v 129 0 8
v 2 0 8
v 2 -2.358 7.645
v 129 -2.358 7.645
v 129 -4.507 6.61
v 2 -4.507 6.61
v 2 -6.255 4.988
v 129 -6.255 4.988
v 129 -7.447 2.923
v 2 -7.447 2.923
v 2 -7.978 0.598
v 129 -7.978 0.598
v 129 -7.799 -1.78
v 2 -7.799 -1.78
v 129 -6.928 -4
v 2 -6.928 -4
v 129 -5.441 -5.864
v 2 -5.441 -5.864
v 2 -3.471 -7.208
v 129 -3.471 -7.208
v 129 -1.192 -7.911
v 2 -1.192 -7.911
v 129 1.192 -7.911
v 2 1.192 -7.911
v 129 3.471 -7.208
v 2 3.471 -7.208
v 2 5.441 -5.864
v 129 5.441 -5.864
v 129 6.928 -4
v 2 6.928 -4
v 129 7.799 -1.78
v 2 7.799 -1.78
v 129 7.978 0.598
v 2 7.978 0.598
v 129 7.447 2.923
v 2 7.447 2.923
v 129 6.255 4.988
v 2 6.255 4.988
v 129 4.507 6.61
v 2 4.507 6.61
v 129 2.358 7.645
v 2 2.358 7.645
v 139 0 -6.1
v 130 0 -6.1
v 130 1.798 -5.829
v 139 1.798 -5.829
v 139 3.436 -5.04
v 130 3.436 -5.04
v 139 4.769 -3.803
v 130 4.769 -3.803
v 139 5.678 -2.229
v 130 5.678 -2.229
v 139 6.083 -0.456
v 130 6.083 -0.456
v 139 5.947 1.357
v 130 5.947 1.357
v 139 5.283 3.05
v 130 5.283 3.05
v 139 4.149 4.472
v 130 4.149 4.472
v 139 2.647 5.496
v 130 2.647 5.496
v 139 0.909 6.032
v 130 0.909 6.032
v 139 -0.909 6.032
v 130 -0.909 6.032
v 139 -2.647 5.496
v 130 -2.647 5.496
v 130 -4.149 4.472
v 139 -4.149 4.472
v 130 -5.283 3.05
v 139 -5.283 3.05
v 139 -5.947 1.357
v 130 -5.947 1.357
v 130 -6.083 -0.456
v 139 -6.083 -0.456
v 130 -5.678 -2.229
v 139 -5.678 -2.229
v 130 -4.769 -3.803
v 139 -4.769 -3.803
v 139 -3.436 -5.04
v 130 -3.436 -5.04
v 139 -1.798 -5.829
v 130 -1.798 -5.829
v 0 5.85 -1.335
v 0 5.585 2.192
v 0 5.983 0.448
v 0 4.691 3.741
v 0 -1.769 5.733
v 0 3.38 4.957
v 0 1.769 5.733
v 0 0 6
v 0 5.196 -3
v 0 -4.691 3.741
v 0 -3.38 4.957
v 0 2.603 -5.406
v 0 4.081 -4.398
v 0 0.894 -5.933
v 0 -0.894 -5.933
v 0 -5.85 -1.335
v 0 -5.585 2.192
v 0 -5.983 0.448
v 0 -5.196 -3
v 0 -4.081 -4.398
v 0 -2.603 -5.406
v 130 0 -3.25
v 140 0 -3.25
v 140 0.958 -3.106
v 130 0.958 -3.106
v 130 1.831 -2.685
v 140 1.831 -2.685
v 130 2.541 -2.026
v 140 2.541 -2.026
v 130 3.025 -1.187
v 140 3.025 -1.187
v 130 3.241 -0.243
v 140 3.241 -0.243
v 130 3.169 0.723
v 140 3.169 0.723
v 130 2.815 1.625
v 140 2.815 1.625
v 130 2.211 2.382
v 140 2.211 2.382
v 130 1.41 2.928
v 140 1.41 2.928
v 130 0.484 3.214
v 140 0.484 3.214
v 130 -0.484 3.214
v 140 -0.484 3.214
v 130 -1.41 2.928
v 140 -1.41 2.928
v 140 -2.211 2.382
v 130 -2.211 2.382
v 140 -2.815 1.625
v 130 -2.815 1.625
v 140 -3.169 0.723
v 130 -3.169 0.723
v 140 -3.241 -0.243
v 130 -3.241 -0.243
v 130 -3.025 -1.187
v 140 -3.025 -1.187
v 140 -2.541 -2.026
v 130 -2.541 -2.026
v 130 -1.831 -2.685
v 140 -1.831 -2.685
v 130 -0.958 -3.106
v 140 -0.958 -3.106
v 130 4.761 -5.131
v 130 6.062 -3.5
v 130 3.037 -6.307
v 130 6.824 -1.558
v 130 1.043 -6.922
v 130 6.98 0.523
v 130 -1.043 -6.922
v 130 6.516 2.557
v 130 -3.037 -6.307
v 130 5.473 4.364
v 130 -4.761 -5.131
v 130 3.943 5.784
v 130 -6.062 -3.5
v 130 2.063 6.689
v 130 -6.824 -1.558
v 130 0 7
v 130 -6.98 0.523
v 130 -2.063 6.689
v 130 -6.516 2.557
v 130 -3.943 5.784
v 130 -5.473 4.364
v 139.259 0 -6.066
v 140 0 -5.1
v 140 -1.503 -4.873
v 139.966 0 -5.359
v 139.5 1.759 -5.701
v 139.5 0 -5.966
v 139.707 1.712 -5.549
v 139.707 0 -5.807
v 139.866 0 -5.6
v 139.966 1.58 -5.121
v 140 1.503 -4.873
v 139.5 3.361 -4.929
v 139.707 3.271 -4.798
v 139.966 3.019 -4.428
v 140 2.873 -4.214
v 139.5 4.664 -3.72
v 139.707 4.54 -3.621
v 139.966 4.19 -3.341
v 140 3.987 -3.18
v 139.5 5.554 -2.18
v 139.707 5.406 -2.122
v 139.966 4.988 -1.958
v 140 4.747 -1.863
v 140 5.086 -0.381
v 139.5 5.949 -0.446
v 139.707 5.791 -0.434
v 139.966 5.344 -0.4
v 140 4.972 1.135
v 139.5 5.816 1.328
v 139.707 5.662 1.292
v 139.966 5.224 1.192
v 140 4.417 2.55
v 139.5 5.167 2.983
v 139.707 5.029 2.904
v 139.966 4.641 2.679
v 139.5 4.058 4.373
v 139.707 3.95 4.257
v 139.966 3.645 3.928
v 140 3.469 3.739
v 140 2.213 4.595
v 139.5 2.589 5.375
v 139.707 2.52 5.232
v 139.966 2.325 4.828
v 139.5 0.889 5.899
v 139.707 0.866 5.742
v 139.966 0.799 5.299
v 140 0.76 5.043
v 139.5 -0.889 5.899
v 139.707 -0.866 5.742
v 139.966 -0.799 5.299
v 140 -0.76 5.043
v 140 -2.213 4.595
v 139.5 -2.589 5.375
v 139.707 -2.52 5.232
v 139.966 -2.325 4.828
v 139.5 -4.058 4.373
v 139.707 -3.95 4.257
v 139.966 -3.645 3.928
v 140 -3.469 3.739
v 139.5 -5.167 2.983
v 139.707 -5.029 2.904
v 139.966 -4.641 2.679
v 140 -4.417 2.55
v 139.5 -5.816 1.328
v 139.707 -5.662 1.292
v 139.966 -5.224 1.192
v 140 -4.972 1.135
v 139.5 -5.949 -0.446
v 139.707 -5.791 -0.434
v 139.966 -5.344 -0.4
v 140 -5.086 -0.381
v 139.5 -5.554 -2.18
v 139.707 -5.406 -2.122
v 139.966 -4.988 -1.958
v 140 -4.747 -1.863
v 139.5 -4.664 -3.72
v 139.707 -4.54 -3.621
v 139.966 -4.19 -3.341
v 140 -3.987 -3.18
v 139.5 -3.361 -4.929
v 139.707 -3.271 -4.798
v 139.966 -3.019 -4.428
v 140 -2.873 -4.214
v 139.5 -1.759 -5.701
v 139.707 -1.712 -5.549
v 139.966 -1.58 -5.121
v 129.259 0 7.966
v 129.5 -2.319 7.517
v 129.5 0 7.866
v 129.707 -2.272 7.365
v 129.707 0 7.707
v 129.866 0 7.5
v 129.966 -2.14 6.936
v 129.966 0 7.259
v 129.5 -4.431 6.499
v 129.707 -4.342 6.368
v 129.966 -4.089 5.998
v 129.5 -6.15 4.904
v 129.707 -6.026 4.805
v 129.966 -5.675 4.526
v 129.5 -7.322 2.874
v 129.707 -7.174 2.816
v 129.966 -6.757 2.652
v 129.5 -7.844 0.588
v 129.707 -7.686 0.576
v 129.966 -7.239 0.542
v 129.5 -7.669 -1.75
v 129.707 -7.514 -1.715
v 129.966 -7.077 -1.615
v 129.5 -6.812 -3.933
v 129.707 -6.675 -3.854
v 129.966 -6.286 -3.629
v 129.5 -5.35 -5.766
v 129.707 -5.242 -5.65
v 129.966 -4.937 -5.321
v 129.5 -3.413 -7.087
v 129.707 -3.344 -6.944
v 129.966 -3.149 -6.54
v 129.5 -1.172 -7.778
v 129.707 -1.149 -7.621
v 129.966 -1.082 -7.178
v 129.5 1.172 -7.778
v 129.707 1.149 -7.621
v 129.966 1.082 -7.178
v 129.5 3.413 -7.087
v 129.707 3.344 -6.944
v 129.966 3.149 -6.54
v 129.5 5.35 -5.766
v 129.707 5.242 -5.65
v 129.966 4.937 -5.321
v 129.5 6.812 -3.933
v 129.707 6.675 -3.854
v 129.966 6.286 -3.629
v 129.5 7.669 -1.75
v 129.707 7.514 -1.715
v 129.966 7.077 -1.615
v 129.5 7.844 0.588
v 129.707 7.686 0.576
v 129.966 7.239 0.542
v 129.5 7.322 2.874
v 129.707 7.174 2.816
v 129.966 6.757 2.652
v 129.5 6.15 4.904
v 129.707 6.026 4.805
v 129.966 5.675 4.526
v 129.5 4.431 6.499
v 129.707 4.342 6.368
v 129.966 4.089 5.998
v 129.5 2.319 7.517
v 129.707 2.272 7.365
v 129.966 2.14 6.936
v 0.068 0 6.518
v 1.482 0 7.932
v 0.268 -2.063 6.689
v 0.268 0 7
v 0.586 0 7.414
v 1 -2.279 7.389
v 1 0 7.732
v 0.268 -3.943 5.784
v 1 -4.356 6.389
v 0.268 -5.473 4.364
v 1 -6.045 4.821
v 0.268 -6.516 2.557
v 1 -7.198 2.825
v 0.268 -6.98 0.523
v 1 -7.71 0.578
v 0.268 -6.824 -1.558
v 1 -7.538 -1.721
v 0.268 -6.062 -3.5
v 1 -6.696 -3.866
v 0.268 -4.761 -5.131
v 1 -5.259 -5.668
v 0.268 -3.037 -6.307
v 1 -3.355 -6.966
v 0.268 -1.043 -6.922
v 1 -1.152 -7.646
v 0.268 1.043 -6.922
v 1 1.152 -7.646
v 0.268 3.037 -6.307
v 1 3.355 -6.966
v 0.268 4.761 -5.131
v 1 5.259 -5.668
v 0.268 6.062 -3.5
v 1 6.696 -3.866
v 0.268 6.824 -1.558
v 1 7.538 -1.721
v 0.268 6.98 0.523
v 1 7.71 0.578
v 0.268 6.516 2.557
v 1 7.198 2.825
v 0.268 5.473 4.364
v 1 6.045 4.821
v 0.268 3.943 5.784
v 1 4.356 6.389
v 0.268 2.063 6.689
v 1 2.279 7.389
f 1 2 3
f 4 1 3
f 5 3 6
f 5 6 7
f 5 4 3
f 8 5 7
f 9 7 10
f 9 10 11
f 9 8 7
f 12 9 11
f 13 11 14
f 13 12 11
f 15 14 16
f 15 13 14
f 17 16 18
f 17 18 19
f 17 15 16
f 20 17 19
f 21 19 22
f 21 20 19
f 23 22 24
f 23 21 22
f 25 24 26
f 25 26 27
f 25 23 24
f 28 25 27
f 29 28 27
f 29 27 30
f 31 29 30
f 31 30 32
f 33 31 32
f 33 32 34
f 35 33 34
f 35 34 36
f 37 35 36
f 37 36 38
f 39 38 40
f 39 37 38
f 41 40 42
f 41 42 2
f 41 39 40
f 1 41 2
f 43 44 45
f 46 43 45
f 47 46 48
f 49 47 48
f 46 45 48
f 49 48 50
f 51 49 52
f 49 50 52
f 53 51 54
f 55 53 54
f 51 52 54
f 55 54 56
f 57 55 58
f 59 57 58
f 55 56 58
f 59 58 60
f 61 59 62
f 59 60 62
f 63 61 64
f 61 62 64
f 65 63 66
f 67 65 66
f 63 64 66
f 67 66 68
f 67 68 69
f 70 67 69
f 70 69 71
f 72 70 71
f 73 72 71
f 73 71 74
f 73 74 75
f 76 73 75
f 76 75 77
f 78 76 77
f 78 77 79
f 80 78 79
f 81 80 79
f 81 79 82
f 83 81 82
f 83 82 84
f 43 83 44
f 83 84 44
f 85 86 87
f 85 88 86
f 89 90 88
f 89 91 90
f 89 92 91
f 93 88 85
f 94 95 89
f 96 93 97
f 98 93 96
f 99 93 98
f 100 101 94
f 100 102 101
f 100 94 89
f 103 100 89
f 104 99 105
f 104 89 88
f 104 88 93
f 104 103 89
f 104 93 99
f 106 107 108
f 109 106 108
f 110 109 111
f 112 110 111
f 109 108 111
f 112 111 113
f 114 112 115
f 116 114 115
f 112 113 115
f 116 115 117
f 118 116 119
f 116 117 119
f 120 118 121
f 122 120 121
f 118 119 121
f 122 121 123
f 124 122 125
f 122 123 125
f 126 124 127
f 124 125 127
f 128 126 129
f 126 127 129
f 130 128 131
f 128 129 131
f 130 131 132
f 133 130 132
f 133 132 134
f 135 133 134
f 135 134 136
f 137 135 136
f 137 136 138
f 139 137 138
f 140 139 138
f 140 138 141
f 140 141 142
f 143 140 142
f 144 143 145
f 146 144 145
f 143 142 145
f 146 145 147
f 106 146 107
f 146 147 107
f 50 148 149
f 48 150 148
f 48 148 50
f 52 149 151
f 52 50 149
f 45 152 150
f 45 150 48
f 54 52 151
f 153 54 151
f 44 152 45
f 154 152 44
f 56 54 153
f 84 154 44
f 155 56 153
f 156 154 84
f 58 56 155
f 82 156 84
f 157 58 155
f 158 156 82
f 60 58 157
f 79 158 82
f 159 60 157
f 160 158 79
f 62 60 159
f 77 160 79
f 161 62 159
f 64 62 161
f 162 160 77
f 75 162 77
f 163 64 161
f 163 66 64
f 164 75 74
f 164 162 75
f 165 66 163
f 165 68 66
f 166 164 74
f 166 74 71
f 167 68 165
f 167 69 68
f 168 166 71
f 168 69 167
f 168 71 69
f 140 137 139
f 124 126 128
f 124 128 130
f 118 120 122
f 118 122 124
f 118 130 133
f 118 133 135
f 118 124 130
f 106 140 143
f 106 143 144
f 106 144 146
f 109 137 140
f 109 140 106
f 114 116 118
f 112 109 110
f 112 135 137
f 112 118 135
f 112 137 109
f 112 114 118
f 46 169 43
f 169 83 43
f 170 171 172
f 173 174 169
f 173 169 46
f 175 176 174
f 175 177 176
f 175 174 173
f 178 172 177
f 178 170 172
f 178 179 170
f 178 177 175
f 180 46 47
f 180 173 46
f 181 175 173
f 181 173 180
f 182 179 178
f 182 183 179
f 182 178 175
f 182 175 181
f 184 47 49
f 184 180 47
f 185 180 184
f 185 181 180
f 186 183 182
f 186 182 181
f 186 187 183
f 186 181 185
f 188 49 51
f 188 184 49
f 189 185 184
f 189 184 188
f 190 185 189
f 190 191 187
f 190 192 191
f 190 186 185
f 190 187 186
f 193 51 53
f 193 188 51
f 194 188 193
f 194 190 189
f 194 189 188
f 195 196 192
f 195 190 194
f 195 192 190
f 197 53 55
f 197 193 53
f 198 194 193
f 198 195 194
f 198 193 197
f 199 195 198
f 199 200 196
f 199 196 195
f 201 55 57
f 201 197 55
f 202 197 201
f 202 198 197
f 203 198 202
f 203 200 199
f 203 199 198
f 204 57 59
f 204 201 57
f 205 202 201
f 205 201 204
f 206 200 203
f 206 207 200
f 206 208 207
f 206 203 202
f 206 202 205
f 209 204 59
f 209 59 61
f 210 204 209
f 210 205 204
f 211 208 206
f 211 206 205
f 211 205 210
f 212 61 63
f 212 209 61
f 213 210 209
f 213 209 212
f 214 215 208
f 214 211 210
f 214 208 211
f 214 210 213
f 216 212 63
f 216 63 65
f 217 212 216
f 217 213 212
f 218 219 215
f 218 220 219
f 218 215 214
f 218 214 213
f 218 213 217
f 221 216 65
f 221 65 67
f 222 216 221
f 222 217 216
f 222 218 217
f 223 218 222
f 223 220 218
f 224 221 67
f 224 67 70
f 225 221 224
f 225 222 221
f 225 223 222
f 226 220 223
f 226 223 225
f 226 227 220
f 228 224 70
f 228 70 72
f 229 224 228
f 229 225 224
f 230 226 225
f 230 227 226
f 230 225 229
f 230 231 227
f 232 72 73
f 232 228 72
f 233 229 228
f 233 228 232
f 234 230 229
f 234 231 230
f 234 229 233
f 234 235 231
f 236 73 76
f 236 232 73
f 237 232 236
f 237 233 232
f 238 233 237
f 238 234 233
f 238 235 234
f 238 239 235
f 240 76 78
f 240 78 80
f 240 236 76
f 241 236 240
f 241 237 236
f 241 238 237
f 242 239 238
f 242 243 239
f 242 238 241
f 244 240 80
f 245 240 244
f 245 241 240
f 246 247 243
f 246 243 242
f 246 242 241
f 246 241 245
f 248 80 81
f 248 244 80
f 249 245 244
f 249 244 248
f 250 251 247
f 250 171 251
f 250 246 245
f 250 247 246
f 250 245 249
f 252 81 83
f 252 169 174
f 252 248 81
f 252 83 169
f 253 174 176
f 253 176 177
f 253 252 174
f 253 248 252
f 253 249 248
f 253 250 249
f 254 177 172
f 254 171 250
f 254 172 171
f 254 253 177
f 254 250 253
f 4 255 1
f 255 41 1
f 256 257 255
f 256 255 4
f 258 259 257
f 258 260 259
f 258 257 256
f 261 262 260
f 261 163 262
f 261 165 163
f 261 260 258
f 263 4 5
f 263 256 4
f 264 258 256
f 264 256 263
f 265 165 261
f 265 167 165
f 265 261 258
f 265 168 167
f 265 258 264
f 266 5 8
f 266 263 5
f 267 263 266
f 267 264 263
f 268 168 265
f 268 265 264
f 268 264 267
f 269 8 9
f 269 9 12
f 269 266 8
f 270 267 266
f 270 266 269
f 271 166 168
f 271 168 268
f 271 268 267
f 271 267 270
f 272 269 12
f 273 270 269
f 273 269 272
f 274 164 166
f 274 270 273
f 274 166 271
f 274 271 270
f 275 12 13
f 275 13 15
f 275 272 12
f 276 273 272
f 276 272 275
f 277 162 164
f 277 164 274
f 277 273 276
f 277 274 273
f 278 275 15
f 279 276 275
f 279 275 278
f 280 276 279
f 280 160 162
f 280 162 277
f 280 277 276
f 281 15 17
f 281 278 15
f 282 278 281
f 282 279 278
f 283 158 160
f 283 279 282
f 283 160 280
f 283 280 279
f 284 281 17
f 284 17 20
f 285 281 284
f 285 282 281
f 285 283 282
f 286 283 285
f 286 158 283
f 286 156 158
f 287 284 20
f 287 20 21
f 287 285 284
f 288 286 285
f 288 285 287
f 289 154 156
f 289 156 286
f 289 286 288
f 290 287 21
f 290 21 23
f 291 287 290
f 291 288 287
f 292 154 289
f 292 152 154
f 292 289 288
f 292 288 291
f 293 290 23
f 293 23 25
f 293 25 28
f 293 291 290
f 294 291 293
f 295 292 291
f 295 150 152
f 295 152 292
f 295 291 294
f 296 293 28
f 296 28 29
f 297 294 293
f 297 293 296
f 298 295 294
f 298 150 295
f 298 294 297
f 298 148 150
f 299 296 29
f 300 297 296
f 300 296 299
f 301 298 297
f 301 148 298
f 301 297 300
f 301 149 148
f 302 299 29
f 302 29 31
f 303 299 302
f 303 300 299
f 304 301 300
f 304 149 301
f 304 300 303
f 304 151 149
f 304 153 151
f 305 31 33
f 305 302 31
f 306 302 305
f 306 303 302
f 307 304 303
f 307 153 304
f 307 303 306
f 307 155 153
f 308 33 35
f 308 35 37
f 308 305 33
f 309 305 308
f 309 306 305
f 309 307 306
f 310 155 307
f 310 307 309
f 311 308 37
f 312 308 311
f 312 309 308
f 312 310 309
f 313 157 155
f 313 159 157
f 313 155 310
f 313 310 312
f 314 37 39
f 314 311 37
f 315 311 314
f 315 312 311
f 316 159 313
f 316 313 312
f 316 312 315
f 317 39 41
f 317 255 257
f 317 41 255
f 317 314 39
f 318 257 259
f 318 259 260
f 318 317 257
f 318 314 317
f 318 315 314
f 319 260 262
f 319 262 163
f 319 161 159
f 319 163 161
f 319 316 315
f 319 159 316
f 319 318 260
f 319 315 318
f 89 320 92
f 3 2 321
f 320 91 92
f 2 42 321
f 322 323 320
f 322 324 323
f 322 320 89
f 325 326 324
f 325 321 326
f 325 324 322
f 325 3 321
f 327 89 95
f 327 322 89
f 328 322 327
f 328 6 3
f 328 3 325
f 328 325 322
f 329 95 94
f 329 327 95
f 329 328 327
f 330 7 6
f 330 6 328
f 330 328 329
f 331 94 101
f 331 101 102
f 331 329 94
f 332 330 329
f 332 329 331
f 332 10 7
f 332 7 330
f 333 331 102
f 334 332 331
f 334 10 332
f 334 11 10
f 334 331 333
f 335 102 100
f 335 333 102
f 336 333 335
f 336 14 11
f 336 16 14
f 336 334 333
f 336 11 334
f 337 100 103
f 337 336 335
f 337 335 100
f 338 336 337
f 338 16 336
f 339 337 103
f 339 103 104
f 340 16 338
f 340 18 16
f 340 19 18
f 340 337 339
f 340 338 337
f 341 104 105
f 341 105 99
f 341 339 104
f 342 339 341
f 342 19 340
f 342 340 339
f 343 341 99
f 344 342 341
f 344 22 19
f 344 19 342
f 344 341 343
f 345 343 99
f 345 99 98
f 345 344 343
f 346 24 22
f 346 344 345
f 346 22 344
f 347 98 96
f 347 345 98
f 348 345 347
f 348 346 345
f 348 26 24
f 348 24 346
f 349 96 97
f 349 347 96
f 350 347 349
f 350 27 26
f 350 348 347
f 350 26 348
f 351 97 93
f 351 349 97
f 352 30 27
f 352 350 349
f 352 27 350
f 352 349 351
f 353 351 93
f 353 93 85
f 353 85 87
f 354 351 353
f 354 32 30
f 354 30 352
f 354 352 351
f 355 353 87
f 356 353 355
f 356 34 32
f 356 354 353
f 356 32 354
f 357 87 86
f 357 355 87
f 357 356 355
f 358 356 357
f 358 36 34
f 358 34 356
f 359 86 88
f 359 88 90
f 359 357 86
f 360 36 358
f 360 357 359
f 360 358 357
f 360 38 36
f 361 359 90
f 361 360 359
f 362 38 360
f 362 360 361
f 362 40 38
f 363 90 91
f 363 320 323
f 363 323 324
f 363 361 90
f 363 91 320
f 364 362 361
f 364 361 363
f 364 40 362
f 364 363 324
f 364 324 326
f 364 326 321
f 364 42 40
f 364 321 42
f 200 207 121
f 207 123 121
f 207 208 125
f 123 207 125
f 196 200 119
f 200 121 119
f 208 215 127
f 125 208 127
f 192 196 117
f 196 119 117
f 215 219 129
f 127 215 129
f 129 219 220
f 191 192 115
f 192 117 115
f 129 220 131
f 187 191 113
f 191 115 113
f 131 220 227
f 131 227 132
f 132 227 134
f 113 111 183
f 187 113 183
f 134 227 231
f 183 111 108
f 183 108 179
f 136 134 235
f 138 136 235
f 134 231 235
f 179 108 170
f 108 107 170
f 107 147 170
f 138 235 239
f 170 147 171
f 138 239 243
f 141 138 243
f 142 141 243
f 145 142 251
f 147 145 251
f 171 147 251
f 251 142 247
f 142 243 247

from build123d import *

# Parameters (mm, degrees)
IZIM1_W               = 140
IZIM1_H               = 8
KES_EKSTR_ZYON1_START = -10
IZIM2_R               = 8
IZIM2_R_2             = 6.1
KES_EKSTR_ZYON1_DEPTH = 10
IZIM3_R               = 3.25
KES_EKSTR_ZYON2_DEPTH = 10
RADYUS1_R             = 2
RADYUS2_R             = 1


with BuildPart() as part:
    # Çizim1 → Döndür1 (revolve)
    with BuildSketch(Plane.XY, mode=Mode.PRIVATE) as d_nd_r1_sk:
        with Locations((70, 4)):
            Rectangle(IZIM1_W, IZIM1_H)
    revolve(d_nd_r1_sk.sketch.rotate(Axis((0, 0, 0), (1, 0, 0)), 90), axis=Axis((0, 0, 0), (1, 0, 0)))

    # Çizim2 → Kes-Ekstrüzyon1 (cut)
    with BuildSketch(Plane(origin=(140, 0, 0), x_dir=(0, 0, -1), z_dir=(1, 0, 0)).offset(KES_EKSTR_ZYON1_START)):
        with Locations(Location((0, 0, 0), (0, 0, 180))):
            Circle(IZIM2_R)
        Circle(IZIM2_R_2, mode=Mode.SUBTRACT)
    extrude(amount=KES_EKSTR_ZYON1_DEPTH, mode=Mode.SUBTRACT)

    # Çizim3 → Kes-Ekstrüzyon2 (cut)
    with BuildSketch(Plane(origin=(140, 0, 0), x_dir=(0, 0, -1), z_dir=(1, 0, 0))):
        Circle(IZIM3_R)
    extrude(amount=-KES_EKSTR_ZYON2_DEPTH, mode=Mode.SUBTRACT)

    # Radyus1
    radyus1_edges = [part.edges().sort_by_distance(p)[0] for p in [
        (0, 0, -8),
    ]]
    fillet(radyus1_edges, radius=RADYUS1_R)

    # Radyus2
    radyus2_edges = [part.edges().sort_by_distance(p)[0] for p in [
        (130, 0, -8),
        (140, 0, 6.1),
    ]]
    fillet(radyus2_edges, radius=RADYUS2_R)


solid = part.part
